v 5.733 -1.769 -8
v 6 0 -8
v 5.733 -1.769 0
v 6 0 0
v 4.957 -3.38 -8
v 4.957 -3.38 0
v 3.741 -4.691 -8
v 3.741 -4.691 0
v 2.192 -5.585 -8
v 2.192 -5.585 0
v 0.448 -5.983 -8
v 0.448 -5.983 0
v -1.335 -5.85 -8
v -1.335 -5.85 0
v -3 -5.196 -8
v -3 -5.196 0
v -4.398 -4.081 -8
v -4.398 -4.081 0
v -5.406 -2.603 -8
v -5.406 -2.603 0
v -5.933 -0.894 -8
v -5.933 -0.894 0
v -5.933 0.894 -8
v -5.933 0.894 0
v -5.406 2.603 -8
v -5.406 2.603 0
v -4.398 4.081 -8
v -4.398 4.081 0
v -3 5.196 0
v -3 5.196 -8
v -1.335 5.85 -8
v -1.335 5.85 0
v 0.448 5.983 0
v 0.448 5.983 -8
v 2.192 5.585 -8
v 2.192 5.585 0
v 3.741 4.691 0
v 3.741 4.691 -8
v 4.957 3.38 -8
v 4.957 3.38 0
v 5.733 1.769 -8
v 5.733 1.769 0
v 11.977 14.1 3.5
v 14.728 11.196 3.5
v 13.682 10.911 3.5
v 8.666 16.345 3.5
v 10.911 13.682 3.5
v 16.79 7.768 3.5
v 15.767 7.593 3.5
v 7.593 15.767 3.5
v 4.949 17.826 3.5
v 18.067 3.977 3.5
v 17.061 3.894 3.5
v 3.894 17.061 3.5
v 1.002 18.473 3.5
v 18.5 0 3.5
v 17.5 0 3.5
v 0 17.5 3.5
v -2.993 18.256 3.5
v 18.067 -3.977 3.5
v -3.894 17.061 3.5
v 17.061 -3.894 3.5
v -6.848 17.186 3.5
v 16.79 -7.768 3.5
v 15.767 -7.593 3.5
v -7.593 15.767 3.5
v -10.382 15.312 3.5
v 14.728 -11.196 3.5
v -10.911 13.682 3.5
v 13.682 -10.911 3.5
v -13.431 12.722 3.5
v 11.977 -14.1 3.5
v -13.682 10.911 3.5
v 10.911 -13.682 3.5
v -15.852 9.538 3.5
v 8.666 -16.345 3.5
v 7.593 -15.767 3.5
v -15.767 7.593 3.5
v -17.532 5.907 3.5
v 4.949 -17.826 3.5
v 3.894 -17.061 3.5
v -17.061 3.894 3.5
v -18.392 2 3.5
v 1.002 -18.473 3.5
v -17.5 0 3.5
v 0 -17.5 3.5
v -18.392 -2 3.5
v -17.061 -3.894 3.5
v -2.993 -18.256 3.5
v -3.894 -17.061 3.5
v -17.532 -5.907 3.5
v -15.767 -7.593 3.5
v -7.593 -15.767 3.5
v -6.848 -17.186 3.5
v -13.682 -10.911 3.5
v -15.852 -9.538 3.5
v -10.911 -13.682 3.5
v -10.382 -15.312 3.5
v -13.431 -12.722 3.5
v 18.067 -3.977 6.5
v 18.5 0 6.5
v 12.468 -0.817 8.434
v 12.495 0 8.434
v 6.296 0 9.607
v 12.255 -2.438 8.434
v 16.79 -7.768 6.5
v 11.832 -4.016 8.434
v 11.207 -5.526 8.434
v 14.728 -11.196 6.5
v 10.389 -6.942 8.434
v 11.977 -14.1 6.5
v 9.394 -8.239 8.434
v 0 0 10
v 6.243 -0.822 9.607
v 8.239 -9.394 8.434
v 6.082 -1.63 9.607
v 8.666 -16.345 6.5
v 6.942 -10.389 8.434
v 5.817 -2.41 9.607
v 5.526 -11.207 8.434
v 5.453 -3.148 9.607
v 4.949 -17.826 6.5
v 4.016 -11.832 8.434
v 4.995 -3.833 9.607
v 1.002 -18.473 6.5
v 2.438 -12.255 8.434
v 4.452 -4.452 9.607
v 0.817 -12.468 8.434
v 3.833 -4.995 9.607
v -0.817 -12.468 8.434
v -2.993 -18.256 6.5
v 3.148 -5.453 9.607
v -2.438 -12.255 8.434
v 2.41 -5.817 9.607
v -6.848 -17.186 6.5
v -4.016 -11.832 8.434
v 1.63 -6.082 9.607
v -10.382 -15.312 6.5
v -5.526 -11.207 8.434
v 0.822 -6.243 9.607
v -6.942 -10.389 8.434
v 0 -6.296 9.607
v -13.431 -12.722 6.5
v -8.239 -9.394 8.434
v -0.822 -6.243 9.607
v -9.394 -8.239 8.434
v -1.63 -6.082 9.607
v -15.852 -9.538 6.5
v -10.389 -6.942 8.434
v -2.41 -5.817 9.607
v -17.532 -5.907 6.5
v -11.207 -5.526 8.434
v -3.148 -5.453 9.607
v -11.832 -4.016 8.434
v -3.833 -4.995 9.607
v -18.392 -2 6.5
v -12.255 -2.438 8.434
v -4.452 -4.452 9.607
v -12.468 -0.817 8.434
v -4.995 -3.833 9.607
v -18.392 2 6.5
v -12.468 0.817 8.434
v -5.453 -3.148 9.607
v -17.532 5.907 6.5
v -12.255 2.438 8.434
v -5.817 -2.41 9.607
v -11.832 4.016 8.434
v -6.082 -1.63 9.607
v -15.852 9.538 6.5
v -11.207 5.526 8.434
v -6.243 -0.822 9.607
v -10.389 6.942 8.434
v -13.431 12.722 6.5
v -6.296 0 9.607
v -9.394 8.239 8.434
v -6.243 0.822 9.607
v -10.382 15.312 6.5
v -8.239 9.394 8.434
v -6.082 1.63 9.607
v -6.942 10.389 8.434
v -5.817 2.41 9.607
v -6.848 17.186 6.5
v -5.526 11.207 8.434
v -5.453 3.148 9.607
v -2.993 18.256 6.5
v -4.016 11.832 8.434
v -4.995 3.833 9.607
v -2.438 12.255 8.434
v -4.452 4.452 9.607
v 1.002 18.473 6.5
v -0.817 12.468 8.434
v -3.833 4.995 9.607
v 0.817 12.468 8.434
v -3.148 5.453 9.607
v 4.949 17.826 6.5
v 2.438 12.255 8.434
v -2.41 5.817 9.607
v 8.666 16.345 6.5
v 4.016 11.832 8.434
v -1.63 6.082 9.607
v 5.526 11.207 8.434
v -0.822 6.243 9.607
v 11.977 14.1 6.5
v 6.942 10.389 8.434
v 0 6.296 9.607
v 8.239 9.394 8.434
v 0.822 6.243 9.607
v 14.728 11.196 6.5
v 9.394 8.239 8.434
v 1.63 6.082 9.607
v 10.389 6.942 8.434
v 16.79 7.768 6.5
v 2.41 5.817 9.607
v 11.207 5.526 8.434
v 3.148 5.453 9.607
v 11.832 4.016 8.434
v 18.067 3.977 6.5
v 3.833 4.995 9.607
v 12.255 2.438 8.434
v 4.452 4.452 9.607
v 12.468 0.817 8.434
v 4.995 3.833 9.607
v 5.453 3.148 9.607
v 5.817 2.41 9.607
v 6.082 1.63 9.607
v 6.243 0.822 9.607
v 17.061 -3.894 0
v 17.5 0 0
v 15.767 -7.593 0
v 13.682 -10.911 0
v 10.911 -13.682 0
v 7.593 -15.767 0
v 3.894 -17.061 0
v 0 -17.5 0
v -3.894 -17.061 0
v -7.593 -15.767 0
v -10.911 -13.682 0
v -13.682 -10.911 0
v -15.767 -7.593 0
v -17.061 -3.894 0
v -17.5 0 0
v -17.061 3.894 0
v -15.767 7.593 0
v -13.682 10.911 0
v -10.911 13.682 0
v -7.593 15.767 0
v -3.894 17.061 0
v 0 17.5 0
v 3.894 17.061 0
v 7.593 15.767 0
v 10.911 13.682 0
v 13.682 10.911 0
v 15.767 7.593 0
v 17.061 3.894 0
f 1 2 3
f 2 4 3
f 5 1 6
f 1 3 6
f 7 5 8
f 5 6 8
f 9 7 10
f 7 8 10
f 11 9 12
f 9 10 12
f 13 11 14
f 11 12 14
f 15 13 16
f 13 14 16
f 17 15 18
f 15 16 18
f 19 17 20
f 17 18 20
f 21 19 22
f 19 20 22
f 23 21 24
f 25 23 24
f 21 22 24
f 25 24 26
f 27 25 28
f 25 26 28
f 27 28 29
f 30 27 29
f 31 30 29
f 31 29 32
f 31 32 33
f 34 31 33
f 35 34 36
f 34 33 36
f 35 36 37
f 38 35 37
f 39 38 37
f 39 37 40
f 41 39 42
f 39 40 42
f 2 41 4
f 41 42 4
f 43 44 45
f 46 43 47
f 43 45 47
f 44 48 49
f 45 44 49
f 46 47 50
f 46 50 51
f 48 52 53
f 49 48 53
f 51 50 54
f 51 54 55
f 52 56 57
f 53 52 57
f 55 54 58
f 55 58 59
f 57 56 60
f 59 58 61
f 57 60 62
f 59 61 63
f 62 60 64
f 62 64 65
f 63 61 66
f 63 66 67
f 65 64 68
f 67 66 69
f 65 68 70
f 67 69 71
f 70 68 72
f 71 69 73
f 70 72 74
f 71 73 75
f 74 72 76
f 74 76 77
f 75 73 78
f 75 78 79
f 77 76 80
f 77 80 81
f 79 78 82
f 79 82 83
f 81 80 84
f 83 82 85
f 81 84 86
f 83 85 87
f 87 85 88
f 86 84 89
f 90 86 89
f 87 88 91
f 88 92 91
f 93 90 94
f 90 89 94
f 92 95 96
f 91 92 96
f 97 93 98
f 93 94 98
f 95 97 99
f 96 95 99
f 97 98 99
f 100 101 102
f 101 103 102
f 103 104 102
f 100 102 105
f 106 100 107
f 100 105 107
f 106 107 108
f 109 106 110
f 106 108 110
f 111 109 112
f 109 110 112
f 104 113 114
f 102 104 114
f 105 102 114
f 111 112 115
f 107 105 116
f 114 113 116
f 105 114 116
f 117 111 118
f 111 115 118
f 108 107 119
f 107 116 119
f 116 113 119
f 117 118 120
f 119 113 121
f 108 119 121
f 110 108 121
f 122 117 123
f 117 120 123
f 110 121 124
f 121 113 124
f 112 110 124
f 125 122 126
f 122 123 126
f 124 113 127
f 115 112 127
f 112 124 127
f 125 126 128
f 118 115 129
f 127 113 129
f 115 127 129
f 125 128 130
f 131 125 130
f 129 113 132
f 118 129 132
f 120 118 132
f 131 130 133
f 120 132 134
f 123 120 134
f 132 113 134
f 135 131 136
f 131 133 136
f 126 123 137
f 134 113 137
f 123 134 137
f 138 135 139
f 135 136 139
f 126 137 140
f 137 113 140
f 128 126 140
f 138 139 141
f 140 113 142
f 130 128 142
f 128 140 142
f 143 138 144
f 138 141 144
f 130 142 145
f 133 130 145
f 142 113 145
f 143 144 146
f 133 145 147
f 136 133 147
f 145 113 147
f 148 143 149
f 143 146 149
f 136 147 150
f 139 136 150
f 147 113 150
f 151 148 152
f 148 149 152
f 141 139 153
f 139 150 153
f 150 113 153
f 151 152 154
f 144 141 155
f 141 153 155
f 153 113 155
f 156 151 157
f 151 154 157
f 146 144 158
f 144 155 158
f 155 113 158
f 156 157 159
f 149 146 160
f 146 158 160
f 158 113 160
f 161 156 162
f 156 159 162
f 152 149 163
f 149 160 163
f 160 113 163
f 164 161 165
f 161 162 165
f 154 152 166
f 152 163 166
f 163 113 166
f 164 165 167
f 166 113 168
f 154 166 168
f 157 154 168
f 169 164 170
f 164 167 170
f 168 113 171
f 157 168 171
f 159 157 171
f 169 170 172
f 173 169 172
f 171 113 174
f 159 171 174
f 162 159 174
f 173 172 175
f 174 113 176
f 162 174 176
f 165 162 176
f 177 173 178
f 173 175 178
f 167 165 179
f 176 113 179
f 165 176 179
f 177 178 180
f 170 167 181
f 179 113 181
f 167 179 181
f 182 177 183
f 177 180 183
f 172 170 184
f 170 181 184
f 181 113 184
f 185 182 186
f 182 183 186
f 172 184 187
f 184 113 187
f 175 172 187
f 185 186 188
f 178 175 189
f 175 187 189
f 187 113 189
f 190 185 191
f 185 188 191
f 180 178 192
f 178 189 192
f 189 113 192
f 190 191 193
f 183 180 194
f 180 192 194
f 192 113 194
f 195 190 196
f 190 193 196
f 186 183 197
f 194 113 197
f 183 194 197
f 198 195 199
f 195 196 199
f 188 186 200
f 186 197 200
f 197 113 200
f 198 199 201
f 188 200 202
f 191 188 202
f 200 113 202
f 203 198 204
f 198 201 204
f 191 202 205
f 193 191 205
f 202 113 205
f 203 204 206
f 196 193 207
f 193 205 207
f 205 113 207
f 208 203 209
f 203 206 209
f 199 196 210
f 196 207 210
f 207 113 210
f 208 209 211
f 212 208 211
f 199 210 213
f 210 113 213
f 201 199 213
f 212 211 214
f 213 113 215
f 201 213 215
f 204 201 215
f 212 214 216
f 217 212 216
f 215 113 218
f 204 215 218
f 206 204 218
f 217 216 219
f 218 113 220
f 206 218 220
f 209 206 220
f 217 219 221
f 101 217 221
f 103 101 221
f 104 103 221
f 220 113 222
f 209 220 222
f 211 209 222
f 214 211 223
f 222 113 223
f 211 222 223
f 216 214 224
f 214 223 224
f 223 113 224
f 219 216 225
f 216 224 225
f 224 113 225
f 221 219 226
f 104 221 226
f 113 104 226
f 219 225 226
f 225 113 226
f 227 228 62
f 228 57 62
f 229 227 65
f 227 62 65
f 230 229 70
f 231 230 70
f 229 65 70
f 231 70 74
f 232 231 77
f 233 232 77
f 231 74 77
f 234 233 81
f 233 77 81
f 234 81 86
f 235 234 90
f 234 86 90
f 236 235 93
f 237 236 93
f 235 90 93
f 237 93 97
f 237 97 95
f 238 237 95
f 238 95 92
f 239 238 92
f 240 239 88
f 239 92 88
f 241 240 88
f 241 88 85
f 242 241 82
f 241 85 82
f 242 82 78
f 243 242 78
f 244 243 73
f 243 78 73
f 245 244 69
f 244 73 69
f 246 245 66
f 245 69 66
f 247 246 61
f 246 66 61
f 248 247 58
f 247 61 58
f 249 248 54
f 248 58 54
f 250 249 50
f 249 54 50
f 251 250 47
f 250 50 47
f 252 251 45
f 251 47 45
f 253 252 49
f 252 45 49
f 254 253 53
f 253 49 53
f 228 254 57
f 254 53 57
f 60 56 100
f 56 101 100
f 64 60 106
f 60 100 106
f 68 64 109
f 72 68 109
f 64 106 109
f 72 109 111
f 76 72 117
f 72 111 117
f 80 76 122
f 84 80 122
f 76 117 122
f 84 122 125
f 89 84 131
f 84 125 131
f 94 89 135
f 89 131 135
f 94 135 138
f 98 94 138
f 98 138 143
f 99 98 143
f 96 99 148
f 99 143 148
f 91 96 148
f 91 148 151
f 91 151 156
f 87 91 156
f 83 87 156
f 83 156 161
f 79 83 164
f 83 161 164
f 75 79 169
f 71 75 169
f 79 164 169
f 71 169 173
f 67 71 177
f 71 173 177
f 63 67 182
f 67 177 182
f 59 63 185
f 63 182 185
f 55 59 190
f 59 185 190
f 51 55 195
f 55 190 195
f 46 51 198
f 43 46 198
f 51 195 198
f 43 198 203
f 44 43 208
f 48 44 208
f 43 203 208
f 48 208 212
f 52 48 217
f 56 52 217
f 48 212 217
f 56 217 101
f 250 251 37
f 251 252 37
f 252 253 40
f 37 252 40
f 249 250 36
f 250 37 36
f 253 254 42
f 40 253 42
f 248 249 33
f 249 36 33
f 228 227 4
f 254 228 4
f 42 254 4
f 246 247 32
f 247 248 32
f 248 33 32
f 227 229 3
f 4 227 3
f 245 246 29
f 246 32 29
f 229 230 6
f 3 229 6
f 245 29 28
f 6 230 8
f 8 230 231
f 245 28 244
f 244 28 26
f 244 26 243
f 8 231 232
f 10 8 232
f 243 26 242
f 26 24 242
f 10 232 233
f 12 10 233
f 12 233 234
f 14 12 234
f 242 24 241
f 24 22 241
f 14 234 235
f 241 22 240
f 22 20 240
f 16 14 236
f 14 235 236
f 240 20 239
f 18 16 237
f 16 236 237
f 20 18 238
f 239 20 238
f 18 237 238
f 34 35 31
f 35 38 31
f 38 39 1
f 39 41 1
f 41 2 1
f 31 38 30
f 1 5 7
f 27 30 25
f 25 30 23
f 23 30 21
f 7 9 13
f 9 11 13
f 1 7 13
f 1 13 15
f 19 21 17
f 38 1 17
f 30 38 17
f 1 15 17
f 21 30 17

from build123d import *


with BuildPart() as part:
    # Sketch1 → Revolve1 (revolve)
    with BuildSketch(Plane(origin=(0, 0, 0), x_dir=(0, 0, -1), z_dir=(1, 0, 0)), mode=Mode.PRIVATE) as revolve1_sk:
        with BuildLine():
            Line((8, 0), (8, 6))
            Line((8, 6), (0, 6))
            Line((0, 6), (0, 17.5))
            Line((0, 17.5), (-3.5, 17.5))
            Line((-3.5, 17.5), (-3.5, 18.5))
            Line((-3.5, 18.5), (-6.5, 18.5))
            ThreePointArc((-6.5, 18.5), (-9.117307443, 9.414085192), (-10, 0))
            Line((-10, 0), (8, 0))
        make_face()
    revolve(revolve1_sk.sketch.rotate(Axis((0, 0, -8), (0, 0, -1)), 90), axis=Axis((0, 0, -8), (0, 0, -1)))


solid = part.part
